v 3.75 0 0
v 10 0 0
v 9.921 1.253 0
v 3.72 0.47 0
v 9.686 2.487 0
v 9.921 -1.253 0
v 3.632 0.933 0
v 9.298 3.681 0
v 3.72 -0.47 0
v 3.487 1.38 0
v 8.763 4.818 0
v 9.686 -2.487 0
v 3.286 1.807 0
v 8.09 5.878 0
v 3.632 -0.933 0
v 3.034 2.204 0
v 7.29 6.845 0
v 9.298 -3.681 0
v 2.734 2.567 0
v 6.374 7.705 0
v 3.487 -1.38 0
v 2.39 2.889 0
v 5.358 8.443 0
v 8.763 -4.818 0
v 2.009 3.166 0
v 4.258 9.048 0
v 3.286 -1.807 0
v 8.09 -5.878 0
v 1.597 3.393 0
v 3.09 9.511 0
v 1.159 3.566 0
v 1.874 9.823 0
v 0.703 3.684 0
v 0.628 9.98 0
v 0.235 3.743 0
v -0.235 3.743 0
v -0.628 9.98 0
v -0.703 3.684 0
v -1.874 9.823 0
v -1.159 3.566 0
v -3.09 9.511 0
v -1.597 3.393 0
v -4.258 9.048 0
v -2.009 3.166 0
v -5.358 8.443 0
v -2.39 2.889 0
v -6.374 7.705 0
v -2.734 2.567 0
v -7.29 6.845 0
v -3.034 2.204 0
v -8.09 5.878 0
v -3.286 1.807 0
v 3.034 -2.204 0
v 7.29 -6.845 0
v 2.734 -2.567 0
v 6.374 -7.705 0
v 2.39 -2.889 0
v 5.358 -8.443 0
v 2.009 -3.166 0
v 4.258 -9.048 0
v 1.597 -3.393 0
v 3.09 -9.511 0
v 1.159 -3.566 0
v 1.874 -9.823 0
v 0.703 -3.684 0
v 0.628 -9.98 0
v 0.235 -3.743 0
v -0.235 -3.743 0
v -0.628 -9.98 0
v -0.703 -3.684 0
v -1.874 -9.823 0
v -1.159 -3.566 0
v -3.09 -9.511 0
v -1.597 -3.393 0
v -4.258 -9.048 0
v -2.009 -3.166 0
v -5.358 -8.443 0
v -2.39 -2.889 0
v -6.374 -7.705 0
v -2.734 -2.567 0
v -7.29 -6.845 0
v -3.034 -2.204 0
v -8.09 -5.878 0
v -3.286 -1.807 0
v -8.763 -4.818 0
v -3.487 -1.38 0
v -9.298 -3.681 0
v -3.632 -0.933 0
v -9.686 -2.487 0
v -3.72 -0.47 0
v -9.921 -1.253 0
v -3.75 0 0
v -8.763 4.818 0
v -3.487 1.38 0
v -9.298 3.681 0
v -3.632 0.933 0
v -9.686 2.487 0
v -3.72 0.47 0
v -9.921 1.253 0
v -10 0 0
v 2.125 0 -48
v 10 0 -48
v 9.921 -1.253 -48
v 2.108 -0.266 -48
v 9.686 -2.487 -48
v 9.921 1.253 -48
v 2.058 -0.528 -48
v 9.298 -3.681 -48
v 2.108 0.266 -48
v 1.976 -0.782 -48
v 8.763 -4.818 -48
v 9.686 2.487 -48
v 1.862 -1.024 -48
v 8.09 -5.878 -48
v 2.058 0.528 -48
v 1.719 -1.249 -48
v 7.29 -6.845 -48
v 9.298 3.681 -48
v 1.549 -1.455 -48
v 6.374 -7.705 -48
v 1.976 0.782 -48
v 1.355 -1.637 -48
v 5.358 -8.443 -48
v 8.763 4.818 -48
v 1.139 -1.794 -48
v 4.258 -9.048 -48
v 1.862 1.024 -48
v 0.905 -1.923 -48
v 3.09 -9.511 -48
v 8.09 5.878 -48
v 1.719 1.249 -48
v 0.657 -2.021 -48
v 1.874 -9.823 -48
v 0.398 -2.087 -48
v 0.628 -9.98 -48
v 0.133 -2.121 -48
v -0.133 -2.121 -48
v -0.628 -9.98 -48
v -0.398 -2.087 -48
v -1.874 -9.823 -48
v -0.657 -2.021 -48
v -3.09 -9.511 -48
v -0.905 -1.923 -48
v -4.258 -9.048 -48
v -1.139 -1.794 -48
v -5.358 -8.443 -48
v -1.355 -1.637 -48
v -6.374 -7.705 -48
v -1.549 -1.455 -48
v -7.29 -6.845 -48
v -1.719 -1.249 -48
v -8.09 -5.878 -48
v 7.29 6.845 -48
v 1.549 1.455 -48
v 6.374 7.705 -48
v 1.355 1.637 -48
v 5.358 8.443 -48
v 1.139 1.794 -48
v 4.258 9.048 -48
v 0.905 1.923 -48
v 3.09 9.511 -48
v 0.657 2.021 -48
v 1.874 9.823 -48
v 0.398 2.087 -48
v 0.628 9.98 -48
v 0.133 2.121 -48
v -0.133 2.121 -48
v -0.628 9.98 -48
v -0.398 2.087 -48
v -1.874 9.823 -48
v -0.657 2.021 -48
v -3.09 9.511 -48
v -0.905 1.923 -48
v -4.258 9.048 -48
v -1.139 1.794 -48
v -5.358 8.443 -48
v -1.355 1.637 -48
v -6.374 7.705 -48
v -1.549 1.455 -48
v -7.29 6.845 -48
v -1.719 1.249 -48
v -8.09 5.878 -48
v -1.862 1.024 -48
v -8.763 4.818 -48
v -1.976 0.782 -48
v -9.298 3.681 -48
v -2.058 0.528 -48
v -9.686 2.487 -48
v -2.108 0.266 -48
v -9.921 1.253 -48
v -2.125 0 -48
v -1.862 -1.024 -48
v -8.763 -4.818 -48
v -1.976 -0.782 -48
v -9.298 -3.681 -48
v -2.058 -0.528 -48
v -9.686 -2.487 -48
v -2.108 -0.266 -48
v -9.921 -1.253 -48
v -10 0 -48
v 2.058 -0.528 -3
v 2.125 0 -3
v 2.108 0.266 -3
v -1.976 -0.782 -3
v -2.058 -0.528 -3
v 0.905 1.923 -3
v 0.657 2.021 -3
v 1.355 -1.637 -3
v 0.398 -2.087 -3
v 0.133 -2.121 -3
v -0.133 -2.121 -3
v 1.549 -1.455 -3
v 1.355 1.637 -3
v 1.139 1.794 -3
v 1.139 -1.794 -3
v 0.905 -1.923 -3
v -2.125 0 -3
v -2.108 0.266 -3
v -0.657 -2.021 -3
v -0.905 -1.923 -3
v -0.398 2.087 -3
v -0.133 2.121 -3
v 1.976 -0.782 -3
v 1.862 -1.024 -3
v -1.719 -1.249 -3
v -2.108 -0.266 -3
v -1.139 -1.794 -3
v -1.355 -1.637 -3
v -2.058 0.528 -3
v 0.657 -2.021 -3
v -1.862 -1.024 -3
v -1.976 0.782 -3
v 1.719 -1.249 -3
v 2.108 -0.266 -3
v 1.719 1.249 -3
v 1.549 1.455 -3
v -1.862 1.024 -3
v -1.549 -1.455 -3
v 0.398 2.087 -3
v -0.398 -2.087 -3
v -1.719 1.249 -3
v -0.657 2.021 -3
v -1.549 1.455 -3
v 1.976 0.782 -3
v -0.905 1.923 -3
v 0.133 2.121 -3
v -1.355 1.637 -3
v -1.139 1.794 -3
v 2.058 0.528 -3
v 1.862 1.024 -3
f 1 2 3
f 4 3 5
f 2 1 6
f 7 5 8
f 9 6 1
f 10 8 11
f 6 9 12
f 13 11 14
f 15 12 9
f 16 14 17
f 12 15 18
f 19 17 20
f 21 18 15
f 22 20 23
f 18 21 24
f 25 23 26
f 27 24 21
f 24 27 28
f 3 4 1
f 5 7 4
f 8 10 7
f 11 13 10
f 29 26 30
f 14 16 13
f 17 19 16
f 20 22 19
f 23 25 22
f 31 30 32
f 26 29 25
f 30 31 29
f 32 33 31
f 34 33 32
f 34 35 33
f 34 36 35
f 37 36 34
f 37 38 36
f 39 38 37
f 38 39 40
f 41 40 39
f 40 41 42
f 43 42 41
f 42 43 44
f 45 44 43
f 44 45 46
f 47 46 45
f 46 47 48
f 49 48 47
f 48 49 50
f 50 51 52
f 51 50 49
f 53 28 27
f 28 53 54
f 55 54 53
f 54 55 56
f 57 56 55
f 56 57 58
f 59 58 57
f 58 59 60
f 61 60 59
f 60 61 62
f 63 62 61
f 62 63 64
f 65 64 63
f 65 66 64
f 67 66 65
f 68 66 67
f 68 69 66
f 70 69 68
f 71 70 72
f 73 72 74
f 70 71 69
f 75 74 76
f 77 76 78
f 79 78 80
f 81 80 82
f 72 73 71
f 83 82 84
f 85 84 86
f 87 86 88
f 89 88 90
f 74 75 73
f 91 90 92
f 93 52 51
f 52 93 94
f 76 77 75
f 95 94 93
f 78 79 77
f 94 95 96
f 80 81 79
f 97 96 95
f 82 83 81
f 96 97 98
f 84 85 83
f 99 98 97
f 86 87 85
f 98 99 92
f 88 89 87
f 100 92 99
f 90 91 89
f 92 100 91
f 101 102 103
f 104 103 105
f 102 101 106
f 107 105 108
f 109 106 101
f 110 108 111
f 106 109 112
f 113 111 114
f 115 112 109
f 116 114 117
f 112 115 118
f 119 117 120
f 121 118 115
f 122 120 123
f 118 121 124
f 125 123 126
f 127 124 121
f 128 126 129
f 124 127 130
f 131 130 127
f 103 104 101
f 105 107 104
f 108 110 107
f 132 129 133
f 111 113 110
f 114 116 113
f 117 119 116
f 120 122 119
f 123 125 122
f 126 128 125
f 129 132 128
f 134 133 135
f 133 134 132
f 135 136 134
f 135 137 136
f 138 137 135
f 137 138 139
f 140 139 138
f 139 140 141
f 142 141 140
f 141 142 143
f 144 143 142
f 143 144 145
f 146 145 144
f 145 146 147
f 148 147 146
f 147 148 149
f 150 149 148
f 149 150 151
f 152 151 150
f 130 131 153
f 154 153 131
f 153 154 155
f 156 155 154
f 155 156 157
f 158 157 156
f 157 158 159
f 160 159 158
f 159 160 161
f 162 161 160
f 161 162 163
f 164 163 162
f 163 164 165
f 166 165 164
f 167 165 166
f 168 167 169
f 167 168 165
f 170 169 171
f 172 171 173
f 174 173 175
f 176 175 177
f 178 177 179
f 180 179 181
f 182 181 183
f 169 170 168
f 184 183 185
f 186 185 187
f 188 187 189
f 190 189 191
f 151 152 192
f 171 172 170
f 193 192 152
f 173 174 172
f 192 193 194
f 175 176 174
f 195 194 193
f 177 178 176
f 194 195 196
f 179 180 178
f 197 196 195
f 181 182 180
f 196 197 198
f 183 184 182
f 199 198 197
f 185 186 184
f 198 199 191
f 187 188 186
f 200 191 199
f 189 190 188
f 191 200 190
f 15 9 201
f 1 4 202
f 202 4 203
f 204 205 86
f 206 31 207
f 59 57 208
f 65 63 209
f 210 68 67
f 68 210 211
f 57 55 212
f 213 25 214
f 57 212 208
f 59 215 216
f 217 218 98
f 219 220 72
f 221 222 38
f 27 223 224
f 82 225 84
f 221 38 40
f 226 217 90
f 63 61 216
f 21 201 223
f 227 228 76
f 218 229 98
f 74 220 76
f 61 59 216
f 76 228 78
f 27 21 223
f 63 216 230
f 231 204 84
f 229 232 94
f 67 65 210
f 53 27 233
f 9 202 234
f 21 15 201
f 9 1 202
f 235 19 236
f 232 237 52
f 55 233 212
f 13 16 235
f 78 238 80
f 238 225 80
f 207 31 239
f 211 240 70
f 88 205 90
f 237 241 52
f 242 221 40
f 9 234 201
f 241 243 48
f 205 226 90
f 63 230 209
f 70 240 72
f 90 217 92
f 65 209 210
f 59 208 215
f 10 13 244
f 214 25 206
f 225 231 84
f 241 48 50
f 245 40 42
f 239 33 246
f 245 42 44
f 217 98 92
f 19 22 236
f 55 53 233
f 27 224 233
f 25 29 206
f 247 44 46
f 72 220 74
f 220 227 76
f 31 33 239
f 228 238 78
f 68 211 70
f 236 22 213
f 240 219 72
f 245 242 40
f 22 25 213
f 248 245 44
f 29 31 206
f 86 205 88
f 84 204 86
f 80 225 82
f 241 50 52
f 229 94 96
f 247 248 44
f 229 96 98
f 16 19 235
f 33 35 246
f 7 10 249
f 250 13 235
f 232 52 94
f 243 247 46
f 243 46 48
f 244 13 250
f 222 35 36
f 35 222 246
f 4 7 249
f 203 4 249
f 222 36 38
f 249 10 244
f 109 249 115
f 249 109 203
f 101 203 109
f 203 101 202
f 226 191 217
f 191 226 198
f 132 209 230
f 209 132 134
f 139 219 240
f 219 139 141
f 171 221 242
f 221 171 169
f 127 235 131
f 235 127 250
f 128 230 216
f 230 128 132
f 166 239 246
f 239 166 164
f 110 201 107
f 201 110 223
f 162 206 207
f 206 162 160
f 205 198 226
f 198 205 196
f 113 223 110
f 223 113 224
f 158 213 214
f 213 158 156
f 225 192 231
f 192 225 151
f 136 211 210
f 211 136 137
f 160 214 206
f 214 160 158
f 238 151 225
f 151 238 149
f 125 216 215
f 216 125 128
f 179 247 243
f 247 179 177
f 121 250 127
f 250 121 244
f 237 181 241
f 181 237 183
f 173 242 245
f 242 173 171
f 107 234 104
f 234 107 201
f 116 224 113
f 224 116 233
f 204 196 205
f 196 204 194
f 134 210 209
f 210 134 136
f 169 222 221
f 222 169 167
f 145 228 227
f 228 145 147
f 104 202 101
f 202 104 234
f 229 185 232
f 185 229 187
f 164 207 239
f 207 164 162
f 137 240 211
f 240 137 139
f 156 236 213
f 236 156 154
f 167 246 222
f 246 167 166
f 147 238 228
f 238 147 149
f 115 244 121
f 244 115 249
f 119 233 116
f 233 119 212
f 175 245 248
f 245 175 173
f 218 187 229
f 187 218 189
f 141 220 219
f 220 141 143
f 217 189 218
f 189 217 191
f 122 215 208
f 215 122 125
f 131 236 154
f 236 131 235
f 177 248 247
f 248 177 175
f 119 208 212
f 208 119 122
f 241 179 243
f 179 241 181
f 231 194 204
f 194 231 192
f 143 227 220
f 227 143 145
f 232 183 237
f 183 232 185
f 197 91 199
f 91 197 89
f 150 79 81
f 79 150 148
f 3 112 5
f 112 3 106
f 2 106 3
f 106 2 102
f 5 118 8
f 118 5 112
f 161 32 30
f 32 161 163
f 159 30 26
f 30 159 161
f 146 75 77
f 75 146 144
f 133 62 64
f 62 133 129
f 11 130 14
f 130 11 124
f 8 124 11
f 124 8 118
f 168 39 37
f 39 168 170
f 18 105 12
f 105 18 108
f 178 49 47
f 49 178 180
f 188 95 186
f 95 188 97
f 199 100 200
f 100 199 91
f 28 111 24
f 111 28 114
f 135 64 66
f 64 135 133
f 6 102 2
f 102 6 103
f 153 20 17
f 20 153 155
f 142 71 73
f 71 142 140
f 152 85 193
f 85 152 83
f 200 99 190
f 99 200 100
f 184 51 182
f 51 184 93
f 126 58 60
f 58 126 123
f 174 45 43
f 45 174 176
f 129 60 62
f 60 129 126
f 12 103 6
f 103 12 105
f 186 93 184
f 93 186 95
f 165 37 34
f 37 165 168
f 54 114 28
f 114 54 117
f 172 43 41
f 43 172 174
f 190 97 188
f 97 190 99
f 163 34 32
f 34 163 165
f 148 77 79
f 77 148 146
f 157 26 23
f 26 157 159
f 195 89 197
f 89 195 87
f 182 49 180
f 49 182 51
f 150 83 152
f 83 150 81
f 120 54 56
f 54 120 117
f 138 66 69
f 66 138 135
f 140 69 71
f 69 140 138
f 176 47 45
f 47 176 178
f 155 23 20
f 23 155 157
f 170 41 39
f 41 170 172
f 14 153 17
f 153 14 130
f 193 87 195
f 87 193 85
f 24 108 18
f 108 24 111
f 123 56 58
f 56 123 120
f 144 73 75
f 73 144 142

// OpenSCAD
$fn = 50;


difference() {
	union() {
		translate(v = [0, 0, -48.0000000000]) {
			cylinder(h = 48, r = 10.0000000000);
		}
		cylinder(h = 0, r = 20.0000000000);
	}
	union() {
		translate(v = [0, 0, 0]) {
			rotate(a = [0, 0, 0]) {
				difference() {
					union() {
						#translate(v = [0, 0, -48.0000000000]) {
							cylinder(h = 48, r = 2.0000000000);
						}
						#translate(v = [0, 0, -3]) {
							cylinder(h = 3, r = 10.0000000000, r1 = 2.1250000000, r2 = 3.7500000000);
						}
						#translate(v = [0, 0, -48.0000000000]) {
							cylinder(h = 48, r = 2.1250000000);
						}
						#translate(v = [0, 0, -48.0000000000]) {
							cylinder(h = 48, r = 2.0000000000);
						}
					}
					union();
				}
			}
		}
	}
}
